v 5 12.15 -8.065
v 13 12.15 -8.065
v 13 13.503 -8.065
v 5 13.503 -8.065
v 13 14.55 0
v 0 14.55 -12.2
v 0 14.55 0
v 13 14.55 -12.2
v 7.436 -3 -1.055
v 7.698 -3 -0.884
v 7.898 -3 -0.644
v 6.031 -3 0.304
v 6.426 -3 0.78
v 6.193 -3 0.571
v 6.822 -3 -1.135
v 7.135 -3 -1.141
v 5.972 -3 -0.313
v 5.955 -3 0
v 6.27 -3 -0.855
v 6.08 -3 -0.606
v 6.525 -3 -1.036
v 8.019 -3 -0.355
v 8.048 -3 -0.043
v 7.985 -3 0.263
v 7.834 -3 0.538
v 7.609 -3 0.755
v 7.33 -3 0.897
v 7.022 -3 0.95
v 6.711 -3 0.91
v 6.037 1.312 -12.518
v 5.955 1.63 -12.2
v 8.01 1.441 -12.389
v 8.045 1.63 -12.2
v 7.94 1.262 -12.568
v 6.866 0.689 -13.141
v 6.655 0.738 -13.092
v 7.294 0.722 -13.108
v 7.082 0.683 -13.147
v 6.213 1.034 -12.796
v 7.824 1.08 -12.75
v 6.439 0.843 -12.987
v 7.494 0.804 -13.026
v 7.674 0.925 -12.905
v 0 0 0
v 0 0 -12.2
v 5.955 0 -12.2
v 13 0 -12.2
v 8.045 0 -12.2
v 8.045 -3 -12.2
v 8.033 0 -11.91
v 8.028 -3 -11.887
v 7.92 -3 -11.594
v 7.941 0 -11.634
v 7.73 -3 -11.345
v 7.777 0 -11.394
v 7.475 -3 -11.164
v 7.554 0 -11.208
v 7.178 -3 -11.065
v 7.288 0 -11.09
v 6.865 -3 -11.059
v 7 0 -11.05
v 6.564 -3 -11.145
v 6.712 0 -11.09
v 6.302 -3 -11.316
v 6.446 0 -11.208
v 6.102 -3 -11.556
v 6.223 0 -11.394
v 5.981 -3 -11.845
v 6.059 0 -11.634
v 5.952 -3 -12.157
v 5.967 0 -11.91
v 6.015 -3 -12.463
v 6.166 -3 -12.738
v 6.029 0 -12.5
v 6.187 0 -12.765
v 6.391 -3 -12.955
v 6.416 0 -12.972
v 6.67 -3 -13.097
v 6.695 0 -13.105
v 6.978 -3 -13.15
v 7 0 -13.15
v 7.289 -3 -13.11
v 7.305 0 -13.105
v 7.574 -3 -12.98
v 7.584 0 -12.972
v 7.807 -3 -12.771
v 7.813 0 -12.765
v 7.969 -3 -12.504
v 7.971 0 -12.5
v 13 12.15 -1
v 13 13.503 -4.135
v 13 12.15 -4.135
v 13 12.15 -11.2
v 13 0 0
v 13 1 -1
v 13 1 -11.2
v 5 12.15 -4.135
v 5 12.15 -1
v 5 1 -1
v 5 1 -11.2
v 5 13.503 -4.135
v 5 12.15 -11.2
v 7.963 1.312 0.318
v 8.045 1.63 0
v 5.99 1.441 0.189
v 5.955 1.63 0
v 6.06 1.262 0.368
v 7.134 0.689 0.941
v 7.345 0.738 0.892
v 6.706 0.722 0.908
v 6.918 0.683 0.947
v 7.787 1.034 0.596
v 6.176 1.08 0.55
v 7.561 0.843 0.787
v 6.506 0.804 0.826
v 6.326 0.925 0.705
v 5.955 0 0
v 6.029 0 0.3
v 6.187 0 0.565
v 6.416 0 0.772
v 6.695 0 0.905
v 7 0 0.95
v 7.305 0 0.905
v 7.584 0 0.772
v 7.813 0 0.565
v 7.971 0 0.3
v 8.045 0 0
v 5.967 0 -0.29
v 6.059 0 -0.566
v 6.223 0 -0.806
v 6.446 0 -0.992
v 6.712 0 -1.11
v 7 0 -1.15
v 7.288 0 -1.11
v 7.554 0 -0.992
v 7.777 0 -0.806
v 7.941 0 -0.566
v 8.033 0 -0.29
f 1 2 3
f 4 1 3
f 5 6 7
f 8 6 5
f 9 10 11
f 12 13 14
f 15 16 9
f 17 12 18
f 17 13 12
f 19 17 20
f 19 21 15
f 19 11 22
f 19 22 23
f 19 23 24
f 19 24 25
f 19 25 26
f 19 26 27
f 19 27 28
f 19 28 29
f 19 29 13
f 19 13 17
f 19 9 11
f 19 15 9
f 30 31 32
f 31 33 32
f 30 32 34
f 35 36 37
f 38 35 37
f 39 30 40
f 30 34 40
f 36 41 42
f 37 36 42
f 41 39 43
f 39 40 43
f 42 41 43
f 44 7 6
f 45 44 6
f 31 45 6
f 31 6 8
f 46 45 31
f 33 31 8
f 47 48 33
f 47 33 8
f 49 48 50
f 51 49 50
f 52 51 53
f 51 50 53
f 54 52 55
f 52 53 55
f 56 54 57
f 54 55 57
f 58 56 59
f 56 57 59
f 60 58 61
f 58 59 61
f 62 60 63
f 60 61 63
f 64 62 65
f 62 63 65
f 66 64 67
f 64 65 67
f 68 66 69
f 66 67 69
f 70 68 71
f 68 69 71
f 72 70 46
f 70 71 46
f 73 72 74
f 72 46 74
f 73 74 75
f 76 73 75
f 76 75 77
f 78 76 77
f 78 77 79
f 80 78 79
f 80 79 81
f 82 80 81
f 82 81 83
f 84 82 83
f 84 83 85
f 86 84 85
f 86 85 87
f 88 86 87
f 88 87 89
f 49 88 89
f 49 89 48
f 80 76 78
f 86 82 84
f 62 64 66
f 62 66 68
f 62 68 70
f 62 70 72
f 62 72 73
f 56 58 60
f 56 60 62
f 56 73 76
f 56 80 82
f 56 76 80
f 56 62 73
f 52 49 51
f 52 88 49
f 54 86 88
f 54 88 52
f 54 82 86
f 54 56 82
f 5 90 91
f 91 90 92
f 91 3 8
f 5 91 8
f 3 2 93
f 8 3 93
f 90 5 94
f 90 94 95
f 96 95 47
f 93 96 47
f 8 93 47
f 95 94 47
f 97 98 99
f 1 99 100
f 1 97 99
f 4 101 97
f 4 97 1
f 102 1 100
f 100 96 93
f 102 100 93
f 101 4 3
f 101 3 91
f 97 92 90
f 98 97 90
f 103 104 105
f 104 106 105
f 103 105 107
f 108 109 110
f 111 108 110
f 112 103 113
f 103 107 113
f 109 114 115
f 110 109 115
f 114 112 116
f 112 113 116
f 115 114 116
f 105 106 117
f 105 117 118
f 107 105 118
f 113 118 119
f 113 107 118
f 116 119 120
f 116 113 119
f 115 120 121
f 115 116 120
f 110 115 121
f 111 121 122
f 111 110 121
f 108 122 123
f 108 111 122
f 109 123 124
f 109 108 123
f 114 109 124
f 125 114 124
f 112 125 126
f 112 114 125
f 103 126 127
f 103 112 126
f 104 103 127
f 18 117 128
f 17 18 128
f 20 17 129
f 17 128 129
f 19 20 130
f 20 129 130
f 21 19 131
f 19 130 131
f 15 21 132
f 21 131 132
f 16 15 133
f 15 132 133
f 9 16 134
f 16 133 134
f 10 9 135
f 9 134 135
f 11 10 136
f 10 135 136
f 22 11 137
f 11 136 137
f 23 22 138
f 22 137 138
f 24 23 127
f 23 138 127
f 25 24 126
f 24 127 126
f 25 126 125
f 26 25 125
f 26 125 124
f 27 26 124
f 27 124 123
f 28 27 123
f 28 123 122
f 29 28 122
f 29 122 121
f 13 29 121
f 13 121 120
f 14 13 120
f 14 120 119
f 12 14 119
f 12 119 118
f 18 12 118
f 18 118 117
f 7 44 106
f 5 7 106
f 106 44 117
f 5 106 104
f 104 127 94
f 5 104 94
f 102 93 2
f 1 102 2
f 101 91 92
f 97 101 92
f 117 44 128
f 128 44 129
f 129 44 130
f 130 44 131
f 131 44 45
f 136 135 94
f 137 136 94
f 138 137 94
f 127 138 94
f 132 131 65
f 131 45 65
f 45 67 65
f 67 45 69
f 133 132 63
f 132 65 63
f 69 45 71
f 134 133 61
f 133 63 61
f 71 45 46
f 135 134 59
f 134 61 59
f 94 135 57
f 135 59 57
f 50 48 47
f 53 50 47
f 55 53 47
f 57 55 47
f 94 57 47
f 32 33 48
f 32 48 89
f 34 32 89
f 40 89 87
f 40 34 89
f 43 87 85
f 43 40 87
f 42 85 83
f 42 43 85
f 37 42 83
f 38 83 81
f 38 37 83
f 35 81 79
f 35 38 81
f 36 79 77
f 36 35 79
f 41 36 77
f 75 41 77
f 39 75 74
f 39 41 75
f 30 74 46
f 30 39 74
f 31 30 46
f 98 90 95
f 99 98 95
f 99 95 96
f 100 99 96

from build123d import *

# Parameters (mm, degrees)
SKETCH1_W           = 13
SKETCH1_H           = 12.2
BOSS_EXTRUDE1_DEPTH = 14.55
SKETCH2_R           = 1.05
BOSS_EXTRUDE2_DEPTH = 3
CUT_EXTRUDE1_DEPTH  = 8
CHAMFER1_SIZE       = 1.63


with BuildPart() as part:
    # Sketch1 → Boss-Extrude1 (new body)
    with BuildSketch(Plane(origin=(0, 0, 0), x_dir=(1, 0, 0), z_dir=(0, 1, 0))):
        with Locations((6.5, 6.1)):
            Rectangle(SKETCH1_W, SKETCH1_H)
    extrude(amount=BOSS_EXTRUDE1_DEPTH)

    # Sketch2 → Boss-Extrude2 (add)
    with BuildSketch(Plane.XZ):
        with Locations(Location((7, -0.1, 0), (0, 0, 174.5349762))):
            Circle(SKETCH2_R)
        with Locations(Location((7, -12.1, 0), (0, 0, 354.5349762))):
            Circle(SKETCH2_R)
    extrude(amount=BOSS_EXTRUDE2_DEPTH)

    # Sketch3 → Cut-Extrude1 (cut)
    with BuildSketch(Plane(origin=(13, 0, 0), x_dir=(0, 0, -1), z_dir=(1, 0, 0))):
        Polygon((1.000271868, 12.149637893), (1.000271868, 1.000271868), (11.199728132, 1.000271868), (11.199728132, 12.149637893), (8.065074736, 12.149637893), (8.065074736, 13.503489481), (4.134925264, 13.503489481), (4.134925264, 12.149637893), align=None)
    extrude(amount=-CUT_EXTRUDE1_DEPTH, mode=Mode.SUBTRACT)

    # Chamfer1
    # the kernel refuses this chamfer: 1.63 mm, written as the material it adds along each edge
    with BuildSketch(Plane(origin=(1.762929482, 0, 0), x_dir=(0, 0.9996219169112968, -0.027495876610586376), z_dir=(1, 0, 0))) as chamfer1_piece_1_section:
        Polygon((CHAMFER1_SIZE * 0.999621916911, CHAMFER1_SIZE * 0.0274958766106), (-CHAMFER1_SIZE * 0.0274958766106, CHAMFER1_SIZE * 0.999621916911), (0, 0), align=None)
    chamfer1_piece_1 = extrude(amount=10.474141037, mode=Mode.PRIVATE)
    chamfer1_piece_1 = chamfer1_piece_1 & Plane(origin=(7, 0.64054065, -0.1), x_dir=(-0.9954545219220755, 0, 0.09523809523973083), z_dir=(0, 1, 0)) * Cylinder(1.05, 28, mode=Mode.PRIVATE)
    add(chamfer1_piece_1)
    with BuildSketch(Plane(origin=(12.237070518, 0, -12.2), x_dir=(0, 0.9996219169112968, 0.02749587661058688), z_dir=(-1, 0, 0))) as chamfer1_piece_2_section:
        Polygon((CHAMFER1_SIZE * 0.999621916911, CHAMFER1_SIZE * 0.0274958766106), (-CHAMFER1_SIZE * 0.0274958766106, CHAMFER1_SIZE * 0.999621916911), (0, 0), align=None)
    chamfer1_piece_2 = extrude(amount=10.474141037, mode=Mode.PRIVATE)
    chamfer1_piece_2 = chamfer1_piece_2 & Plane(origin=(7, 0.64054065, -12.1), x_dir=(0.9954545219220756, 0, -0.09523809523973051), z_dir=(0, 1, 0)) * Cylinder(1.05, 28, mode=Mode.PRIVATE)
    add(chamfer1_piece_2)


solid = part.part
